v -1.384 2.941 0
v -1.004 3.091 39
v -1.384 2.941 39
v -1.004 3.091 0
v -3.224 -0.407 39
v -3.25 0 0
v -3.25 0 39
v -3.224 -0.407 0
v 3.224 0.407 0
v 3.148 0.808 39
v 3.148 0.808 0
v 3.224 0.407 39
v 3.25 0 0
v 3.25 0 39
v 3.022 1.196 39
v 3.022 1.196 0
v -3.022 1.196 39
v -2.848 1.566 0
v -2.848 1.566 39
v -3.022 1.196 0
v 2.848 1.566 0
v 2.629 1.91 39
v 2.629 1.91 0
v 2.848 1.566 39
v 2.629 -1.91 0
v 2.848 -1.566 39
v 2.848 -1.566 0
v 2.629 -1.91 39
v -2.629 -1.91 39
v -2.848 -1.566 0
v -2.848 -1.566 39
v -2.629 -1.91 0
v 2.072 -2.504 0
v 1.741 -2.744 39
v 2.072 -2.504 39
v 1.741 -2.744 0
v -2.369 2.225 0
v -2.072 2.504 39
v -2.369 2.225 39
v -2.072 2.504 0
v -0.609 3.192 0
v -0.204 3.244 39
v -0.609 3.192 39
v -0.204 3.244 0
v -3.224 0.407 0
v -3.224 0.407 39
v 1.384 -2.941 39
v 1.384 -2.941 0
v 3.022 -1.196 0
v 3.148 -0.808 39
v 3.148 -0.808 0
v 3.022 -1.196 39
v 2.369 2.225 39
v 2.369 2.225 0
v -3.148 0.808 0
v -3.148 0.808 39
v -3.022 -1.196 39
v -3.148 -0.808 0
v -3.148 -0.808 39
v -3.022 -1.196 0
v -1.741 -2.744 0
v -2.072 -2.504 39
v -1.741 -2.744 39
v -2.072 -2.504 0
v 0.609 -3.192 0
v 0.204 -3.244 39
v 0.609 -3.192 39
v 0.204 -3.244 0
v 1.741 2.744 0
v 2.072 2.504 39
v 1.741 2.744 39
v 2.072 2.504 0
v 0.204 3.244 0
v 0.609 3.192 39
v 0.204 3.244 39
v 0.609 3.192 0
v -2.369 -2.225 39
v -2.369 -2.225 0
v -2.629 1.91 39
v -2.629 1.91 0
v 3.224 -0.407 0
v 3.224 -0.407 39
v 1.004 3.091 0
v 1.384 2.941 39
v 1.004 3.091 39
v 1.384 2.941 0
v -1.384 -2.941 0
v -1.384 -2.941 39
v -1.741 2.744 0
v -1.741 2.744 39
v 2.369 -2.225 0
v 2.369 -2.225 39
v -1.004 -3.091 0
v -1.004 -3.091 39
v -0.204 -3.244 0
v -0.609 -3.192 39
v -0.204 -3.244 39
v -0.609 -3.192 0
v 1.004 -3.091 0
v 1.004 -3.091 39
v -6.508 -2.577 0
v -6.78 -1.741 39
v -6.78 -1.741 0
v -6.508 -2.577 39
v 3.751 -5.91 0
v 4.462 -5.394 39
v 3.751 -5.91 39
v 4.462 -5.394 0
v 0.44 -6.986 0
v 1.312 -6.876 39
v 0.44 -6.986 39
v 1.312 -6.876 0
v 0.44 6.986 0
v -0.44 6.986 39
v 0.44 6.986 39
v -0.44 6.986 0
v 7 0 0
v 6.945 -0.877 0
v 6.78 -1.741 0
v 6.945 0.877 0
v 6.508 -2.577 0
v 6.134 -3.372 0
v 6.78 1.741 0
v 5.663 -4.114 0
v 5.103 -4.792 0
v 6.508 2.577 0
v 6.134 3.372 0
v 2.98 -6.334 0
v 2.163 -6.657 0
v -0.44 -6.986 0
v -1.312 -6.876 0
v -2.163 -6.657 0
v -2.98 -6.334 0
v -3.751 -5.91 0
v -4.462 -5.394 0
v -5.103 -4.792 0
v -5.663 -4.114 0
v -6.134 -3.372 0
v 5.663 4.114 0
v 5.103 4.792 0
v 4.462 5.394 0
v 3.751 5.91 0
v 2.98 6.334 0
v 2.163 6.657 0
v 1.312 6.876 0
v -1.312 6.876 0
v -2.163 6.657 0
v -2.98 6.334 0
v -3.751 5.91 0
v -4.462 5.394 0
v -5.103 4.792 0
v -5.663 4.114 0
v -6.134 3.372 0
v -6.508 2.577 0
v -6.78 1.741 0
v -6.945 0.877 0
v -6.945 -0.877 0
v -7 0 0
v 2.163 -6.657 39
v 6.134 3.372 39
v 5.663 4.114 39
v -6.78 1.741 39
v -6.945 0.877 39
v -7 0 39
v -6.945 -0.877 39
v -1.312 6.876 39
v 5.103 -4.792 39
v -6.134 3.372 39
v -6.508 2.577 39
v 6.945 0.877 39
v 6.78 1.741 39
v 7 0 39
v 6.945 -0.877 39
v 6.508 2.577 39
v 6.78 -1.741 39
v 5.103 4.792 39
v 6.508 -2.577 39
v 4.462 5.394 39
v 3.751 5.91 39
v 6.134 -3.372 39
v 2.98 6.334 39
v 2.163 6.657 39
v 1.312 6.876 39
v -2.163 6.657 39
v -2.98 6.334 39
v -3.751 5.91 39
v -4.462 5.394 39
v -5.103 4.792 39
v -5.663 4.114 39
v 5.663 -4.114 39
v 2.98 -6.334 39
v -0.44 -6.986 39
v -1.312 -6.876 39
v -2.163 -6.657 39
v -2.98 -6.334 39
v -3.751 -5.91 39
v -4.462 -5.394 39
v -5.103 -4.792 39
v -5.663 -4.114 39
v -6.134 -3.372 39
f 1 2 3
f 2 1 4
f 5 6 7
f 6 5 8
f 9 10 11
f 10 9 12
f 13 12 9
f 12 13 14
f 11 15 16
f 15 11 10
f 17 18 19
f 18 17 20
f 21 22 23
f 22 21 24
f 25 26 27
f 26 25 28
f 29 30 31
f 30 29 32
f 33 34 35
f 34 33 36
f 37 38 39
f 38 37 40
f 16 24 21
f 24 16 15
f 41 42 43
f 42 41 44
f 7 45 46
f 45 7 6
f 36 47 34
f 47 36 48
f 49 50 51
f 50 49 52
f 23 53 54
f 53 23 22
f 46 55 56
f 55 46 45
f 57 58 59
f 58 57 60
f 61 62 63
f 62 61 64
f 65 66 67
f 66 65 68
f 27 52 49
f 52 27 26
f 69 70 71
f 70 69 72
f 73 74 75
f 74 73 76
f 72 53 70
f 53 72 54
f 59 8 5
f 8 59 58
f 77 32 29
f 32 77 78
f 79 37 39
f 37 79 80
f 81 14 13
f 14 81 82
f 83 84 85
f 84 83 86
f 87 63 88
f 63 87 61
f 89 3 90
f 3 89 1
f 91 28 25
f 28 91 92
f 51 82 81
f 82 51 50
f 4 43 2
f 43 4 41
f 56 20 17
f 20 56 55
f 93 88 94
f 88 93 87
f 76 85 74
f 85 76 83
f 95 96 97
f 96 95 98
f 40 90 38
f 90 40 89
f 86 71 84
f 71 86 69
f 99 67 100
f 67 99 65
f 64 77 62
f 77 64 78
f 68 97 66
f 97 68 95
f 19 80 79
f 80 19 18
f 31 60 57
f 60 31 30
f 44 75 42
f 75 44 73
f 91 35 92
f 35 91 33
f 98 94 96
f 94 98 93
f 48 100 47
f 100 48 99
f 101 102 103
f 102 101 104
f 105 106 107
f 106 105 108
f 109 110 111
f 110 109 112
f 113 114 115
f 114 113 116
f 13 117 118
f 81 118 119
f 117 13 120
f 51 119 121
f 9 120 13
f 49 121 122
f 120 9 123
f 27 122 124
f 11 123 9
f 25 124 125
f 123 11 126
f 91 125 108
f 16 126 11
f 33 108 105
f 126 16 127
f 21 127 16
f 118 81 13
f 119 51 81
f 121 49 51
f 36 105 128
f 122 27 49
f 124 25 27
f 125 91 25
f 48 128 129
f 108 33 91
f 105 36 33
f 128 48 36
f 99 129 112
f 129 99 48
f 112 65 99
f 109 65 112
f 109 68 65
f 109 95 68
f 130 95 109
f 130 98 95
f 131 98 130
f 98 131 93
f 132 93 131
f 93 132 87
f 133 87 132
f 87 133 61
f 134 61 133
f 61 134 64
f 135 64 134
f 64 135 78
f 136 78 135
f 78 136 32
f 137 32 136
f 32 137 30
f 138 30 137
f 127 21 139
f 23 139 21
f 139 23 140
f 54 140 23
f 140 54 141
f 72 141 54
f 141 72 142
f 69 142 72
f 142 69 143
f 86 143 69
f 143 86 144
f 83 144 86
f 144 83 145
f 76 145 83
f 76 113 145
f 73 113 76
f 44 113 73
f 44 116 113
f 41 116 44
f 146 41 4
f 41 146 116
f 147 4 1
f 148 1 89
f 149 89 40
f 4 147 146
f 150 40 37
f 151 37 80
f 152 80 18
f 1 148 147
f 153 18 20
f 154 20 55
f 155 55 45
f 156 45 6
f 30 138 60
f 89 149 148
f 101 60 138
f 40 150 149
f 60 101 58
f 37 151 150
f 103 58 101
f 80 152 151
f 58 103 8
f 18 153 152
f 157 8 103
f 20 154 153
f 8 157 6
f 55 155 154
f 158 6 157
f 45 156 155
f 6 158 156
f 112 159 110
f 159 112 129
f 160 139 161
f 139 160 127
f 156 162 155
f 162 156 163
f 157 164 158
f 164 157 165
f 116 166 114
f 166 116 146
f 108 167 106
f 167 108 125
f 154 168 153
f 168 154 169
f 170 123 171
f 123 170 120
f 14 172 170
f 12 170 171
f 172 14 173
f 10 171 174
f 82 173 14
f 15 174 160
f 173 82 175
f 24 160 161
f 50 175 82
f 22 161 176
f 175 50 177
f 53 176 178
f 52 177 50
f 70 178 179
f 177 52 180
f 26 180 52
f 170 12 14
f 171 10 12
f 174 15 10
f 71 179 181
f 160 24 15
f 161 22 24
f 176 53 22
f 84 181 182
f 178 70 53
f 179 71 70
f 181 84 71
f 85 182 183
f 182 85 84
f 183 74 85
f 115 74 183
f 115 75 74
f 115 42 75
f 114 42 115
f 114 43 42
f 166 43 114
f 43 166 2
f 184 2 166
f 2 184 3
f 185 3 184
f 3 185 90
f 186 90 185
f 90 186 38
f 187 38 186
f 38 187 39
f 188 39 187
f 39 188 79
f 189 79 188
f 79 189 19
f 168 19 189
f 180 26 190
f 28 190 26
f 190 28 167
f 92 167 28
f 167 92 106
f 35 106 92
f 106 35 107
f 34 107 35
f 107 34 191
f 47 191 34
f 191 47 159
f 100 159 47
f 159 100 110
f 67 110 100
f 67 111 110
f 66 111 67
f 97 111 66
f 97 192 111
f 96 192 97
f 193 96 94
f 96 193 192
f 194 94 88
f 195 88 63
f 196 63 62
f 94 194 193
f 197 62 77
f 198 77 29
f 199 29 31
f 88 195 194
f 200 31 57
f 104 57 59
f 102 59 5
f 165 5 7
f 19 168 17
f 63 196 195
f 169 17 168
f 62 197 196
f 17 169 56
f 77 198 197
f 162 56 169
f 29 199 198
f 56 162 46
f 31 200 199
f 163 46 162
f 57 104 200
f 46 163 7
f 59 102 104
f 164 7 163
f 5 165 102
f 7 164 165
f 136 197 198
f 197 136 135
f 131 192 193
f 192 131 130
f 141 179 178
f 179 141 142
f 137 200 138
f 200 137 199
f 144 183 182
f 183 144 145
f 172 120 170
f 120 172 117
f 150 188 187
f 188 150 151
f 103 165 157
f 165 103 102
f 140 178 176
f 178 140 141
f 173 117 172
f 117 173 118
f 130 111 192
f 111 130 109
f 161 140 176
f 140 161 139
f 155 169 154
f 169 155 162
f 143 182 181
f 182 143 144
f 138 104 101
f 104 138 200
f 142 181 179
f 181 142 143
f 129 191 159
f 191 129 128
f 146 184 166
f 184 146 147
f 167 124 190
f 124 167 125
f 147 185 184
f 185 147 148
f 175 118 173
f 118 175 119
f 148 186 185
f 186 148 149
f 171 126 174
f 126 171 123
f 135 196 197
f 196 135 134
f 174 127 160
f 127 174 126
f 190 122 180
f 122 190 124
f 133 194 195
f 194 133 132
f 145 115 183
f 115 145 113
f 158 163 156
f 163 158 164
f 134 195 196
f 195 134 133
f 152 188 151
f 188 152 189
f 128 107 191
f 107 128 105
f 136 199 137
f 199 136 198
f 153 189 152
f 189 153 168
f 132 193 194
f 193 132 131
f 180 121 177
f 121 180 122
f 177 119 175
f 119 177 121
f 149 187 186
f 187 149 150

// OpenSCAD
$fn = 50;


difference() {
	union() {
		cylinder(h = 39, r = 7.0000000000);
	}
	union() {
		translate(v = [0, 0, -100]) {
			cylinder(h = 200, r = 3.2500000000);
		}
		translate(v = [0, 0, -100]) {
			cylinder(h = 200, r = 1.8000000000);
		}
	}
}
